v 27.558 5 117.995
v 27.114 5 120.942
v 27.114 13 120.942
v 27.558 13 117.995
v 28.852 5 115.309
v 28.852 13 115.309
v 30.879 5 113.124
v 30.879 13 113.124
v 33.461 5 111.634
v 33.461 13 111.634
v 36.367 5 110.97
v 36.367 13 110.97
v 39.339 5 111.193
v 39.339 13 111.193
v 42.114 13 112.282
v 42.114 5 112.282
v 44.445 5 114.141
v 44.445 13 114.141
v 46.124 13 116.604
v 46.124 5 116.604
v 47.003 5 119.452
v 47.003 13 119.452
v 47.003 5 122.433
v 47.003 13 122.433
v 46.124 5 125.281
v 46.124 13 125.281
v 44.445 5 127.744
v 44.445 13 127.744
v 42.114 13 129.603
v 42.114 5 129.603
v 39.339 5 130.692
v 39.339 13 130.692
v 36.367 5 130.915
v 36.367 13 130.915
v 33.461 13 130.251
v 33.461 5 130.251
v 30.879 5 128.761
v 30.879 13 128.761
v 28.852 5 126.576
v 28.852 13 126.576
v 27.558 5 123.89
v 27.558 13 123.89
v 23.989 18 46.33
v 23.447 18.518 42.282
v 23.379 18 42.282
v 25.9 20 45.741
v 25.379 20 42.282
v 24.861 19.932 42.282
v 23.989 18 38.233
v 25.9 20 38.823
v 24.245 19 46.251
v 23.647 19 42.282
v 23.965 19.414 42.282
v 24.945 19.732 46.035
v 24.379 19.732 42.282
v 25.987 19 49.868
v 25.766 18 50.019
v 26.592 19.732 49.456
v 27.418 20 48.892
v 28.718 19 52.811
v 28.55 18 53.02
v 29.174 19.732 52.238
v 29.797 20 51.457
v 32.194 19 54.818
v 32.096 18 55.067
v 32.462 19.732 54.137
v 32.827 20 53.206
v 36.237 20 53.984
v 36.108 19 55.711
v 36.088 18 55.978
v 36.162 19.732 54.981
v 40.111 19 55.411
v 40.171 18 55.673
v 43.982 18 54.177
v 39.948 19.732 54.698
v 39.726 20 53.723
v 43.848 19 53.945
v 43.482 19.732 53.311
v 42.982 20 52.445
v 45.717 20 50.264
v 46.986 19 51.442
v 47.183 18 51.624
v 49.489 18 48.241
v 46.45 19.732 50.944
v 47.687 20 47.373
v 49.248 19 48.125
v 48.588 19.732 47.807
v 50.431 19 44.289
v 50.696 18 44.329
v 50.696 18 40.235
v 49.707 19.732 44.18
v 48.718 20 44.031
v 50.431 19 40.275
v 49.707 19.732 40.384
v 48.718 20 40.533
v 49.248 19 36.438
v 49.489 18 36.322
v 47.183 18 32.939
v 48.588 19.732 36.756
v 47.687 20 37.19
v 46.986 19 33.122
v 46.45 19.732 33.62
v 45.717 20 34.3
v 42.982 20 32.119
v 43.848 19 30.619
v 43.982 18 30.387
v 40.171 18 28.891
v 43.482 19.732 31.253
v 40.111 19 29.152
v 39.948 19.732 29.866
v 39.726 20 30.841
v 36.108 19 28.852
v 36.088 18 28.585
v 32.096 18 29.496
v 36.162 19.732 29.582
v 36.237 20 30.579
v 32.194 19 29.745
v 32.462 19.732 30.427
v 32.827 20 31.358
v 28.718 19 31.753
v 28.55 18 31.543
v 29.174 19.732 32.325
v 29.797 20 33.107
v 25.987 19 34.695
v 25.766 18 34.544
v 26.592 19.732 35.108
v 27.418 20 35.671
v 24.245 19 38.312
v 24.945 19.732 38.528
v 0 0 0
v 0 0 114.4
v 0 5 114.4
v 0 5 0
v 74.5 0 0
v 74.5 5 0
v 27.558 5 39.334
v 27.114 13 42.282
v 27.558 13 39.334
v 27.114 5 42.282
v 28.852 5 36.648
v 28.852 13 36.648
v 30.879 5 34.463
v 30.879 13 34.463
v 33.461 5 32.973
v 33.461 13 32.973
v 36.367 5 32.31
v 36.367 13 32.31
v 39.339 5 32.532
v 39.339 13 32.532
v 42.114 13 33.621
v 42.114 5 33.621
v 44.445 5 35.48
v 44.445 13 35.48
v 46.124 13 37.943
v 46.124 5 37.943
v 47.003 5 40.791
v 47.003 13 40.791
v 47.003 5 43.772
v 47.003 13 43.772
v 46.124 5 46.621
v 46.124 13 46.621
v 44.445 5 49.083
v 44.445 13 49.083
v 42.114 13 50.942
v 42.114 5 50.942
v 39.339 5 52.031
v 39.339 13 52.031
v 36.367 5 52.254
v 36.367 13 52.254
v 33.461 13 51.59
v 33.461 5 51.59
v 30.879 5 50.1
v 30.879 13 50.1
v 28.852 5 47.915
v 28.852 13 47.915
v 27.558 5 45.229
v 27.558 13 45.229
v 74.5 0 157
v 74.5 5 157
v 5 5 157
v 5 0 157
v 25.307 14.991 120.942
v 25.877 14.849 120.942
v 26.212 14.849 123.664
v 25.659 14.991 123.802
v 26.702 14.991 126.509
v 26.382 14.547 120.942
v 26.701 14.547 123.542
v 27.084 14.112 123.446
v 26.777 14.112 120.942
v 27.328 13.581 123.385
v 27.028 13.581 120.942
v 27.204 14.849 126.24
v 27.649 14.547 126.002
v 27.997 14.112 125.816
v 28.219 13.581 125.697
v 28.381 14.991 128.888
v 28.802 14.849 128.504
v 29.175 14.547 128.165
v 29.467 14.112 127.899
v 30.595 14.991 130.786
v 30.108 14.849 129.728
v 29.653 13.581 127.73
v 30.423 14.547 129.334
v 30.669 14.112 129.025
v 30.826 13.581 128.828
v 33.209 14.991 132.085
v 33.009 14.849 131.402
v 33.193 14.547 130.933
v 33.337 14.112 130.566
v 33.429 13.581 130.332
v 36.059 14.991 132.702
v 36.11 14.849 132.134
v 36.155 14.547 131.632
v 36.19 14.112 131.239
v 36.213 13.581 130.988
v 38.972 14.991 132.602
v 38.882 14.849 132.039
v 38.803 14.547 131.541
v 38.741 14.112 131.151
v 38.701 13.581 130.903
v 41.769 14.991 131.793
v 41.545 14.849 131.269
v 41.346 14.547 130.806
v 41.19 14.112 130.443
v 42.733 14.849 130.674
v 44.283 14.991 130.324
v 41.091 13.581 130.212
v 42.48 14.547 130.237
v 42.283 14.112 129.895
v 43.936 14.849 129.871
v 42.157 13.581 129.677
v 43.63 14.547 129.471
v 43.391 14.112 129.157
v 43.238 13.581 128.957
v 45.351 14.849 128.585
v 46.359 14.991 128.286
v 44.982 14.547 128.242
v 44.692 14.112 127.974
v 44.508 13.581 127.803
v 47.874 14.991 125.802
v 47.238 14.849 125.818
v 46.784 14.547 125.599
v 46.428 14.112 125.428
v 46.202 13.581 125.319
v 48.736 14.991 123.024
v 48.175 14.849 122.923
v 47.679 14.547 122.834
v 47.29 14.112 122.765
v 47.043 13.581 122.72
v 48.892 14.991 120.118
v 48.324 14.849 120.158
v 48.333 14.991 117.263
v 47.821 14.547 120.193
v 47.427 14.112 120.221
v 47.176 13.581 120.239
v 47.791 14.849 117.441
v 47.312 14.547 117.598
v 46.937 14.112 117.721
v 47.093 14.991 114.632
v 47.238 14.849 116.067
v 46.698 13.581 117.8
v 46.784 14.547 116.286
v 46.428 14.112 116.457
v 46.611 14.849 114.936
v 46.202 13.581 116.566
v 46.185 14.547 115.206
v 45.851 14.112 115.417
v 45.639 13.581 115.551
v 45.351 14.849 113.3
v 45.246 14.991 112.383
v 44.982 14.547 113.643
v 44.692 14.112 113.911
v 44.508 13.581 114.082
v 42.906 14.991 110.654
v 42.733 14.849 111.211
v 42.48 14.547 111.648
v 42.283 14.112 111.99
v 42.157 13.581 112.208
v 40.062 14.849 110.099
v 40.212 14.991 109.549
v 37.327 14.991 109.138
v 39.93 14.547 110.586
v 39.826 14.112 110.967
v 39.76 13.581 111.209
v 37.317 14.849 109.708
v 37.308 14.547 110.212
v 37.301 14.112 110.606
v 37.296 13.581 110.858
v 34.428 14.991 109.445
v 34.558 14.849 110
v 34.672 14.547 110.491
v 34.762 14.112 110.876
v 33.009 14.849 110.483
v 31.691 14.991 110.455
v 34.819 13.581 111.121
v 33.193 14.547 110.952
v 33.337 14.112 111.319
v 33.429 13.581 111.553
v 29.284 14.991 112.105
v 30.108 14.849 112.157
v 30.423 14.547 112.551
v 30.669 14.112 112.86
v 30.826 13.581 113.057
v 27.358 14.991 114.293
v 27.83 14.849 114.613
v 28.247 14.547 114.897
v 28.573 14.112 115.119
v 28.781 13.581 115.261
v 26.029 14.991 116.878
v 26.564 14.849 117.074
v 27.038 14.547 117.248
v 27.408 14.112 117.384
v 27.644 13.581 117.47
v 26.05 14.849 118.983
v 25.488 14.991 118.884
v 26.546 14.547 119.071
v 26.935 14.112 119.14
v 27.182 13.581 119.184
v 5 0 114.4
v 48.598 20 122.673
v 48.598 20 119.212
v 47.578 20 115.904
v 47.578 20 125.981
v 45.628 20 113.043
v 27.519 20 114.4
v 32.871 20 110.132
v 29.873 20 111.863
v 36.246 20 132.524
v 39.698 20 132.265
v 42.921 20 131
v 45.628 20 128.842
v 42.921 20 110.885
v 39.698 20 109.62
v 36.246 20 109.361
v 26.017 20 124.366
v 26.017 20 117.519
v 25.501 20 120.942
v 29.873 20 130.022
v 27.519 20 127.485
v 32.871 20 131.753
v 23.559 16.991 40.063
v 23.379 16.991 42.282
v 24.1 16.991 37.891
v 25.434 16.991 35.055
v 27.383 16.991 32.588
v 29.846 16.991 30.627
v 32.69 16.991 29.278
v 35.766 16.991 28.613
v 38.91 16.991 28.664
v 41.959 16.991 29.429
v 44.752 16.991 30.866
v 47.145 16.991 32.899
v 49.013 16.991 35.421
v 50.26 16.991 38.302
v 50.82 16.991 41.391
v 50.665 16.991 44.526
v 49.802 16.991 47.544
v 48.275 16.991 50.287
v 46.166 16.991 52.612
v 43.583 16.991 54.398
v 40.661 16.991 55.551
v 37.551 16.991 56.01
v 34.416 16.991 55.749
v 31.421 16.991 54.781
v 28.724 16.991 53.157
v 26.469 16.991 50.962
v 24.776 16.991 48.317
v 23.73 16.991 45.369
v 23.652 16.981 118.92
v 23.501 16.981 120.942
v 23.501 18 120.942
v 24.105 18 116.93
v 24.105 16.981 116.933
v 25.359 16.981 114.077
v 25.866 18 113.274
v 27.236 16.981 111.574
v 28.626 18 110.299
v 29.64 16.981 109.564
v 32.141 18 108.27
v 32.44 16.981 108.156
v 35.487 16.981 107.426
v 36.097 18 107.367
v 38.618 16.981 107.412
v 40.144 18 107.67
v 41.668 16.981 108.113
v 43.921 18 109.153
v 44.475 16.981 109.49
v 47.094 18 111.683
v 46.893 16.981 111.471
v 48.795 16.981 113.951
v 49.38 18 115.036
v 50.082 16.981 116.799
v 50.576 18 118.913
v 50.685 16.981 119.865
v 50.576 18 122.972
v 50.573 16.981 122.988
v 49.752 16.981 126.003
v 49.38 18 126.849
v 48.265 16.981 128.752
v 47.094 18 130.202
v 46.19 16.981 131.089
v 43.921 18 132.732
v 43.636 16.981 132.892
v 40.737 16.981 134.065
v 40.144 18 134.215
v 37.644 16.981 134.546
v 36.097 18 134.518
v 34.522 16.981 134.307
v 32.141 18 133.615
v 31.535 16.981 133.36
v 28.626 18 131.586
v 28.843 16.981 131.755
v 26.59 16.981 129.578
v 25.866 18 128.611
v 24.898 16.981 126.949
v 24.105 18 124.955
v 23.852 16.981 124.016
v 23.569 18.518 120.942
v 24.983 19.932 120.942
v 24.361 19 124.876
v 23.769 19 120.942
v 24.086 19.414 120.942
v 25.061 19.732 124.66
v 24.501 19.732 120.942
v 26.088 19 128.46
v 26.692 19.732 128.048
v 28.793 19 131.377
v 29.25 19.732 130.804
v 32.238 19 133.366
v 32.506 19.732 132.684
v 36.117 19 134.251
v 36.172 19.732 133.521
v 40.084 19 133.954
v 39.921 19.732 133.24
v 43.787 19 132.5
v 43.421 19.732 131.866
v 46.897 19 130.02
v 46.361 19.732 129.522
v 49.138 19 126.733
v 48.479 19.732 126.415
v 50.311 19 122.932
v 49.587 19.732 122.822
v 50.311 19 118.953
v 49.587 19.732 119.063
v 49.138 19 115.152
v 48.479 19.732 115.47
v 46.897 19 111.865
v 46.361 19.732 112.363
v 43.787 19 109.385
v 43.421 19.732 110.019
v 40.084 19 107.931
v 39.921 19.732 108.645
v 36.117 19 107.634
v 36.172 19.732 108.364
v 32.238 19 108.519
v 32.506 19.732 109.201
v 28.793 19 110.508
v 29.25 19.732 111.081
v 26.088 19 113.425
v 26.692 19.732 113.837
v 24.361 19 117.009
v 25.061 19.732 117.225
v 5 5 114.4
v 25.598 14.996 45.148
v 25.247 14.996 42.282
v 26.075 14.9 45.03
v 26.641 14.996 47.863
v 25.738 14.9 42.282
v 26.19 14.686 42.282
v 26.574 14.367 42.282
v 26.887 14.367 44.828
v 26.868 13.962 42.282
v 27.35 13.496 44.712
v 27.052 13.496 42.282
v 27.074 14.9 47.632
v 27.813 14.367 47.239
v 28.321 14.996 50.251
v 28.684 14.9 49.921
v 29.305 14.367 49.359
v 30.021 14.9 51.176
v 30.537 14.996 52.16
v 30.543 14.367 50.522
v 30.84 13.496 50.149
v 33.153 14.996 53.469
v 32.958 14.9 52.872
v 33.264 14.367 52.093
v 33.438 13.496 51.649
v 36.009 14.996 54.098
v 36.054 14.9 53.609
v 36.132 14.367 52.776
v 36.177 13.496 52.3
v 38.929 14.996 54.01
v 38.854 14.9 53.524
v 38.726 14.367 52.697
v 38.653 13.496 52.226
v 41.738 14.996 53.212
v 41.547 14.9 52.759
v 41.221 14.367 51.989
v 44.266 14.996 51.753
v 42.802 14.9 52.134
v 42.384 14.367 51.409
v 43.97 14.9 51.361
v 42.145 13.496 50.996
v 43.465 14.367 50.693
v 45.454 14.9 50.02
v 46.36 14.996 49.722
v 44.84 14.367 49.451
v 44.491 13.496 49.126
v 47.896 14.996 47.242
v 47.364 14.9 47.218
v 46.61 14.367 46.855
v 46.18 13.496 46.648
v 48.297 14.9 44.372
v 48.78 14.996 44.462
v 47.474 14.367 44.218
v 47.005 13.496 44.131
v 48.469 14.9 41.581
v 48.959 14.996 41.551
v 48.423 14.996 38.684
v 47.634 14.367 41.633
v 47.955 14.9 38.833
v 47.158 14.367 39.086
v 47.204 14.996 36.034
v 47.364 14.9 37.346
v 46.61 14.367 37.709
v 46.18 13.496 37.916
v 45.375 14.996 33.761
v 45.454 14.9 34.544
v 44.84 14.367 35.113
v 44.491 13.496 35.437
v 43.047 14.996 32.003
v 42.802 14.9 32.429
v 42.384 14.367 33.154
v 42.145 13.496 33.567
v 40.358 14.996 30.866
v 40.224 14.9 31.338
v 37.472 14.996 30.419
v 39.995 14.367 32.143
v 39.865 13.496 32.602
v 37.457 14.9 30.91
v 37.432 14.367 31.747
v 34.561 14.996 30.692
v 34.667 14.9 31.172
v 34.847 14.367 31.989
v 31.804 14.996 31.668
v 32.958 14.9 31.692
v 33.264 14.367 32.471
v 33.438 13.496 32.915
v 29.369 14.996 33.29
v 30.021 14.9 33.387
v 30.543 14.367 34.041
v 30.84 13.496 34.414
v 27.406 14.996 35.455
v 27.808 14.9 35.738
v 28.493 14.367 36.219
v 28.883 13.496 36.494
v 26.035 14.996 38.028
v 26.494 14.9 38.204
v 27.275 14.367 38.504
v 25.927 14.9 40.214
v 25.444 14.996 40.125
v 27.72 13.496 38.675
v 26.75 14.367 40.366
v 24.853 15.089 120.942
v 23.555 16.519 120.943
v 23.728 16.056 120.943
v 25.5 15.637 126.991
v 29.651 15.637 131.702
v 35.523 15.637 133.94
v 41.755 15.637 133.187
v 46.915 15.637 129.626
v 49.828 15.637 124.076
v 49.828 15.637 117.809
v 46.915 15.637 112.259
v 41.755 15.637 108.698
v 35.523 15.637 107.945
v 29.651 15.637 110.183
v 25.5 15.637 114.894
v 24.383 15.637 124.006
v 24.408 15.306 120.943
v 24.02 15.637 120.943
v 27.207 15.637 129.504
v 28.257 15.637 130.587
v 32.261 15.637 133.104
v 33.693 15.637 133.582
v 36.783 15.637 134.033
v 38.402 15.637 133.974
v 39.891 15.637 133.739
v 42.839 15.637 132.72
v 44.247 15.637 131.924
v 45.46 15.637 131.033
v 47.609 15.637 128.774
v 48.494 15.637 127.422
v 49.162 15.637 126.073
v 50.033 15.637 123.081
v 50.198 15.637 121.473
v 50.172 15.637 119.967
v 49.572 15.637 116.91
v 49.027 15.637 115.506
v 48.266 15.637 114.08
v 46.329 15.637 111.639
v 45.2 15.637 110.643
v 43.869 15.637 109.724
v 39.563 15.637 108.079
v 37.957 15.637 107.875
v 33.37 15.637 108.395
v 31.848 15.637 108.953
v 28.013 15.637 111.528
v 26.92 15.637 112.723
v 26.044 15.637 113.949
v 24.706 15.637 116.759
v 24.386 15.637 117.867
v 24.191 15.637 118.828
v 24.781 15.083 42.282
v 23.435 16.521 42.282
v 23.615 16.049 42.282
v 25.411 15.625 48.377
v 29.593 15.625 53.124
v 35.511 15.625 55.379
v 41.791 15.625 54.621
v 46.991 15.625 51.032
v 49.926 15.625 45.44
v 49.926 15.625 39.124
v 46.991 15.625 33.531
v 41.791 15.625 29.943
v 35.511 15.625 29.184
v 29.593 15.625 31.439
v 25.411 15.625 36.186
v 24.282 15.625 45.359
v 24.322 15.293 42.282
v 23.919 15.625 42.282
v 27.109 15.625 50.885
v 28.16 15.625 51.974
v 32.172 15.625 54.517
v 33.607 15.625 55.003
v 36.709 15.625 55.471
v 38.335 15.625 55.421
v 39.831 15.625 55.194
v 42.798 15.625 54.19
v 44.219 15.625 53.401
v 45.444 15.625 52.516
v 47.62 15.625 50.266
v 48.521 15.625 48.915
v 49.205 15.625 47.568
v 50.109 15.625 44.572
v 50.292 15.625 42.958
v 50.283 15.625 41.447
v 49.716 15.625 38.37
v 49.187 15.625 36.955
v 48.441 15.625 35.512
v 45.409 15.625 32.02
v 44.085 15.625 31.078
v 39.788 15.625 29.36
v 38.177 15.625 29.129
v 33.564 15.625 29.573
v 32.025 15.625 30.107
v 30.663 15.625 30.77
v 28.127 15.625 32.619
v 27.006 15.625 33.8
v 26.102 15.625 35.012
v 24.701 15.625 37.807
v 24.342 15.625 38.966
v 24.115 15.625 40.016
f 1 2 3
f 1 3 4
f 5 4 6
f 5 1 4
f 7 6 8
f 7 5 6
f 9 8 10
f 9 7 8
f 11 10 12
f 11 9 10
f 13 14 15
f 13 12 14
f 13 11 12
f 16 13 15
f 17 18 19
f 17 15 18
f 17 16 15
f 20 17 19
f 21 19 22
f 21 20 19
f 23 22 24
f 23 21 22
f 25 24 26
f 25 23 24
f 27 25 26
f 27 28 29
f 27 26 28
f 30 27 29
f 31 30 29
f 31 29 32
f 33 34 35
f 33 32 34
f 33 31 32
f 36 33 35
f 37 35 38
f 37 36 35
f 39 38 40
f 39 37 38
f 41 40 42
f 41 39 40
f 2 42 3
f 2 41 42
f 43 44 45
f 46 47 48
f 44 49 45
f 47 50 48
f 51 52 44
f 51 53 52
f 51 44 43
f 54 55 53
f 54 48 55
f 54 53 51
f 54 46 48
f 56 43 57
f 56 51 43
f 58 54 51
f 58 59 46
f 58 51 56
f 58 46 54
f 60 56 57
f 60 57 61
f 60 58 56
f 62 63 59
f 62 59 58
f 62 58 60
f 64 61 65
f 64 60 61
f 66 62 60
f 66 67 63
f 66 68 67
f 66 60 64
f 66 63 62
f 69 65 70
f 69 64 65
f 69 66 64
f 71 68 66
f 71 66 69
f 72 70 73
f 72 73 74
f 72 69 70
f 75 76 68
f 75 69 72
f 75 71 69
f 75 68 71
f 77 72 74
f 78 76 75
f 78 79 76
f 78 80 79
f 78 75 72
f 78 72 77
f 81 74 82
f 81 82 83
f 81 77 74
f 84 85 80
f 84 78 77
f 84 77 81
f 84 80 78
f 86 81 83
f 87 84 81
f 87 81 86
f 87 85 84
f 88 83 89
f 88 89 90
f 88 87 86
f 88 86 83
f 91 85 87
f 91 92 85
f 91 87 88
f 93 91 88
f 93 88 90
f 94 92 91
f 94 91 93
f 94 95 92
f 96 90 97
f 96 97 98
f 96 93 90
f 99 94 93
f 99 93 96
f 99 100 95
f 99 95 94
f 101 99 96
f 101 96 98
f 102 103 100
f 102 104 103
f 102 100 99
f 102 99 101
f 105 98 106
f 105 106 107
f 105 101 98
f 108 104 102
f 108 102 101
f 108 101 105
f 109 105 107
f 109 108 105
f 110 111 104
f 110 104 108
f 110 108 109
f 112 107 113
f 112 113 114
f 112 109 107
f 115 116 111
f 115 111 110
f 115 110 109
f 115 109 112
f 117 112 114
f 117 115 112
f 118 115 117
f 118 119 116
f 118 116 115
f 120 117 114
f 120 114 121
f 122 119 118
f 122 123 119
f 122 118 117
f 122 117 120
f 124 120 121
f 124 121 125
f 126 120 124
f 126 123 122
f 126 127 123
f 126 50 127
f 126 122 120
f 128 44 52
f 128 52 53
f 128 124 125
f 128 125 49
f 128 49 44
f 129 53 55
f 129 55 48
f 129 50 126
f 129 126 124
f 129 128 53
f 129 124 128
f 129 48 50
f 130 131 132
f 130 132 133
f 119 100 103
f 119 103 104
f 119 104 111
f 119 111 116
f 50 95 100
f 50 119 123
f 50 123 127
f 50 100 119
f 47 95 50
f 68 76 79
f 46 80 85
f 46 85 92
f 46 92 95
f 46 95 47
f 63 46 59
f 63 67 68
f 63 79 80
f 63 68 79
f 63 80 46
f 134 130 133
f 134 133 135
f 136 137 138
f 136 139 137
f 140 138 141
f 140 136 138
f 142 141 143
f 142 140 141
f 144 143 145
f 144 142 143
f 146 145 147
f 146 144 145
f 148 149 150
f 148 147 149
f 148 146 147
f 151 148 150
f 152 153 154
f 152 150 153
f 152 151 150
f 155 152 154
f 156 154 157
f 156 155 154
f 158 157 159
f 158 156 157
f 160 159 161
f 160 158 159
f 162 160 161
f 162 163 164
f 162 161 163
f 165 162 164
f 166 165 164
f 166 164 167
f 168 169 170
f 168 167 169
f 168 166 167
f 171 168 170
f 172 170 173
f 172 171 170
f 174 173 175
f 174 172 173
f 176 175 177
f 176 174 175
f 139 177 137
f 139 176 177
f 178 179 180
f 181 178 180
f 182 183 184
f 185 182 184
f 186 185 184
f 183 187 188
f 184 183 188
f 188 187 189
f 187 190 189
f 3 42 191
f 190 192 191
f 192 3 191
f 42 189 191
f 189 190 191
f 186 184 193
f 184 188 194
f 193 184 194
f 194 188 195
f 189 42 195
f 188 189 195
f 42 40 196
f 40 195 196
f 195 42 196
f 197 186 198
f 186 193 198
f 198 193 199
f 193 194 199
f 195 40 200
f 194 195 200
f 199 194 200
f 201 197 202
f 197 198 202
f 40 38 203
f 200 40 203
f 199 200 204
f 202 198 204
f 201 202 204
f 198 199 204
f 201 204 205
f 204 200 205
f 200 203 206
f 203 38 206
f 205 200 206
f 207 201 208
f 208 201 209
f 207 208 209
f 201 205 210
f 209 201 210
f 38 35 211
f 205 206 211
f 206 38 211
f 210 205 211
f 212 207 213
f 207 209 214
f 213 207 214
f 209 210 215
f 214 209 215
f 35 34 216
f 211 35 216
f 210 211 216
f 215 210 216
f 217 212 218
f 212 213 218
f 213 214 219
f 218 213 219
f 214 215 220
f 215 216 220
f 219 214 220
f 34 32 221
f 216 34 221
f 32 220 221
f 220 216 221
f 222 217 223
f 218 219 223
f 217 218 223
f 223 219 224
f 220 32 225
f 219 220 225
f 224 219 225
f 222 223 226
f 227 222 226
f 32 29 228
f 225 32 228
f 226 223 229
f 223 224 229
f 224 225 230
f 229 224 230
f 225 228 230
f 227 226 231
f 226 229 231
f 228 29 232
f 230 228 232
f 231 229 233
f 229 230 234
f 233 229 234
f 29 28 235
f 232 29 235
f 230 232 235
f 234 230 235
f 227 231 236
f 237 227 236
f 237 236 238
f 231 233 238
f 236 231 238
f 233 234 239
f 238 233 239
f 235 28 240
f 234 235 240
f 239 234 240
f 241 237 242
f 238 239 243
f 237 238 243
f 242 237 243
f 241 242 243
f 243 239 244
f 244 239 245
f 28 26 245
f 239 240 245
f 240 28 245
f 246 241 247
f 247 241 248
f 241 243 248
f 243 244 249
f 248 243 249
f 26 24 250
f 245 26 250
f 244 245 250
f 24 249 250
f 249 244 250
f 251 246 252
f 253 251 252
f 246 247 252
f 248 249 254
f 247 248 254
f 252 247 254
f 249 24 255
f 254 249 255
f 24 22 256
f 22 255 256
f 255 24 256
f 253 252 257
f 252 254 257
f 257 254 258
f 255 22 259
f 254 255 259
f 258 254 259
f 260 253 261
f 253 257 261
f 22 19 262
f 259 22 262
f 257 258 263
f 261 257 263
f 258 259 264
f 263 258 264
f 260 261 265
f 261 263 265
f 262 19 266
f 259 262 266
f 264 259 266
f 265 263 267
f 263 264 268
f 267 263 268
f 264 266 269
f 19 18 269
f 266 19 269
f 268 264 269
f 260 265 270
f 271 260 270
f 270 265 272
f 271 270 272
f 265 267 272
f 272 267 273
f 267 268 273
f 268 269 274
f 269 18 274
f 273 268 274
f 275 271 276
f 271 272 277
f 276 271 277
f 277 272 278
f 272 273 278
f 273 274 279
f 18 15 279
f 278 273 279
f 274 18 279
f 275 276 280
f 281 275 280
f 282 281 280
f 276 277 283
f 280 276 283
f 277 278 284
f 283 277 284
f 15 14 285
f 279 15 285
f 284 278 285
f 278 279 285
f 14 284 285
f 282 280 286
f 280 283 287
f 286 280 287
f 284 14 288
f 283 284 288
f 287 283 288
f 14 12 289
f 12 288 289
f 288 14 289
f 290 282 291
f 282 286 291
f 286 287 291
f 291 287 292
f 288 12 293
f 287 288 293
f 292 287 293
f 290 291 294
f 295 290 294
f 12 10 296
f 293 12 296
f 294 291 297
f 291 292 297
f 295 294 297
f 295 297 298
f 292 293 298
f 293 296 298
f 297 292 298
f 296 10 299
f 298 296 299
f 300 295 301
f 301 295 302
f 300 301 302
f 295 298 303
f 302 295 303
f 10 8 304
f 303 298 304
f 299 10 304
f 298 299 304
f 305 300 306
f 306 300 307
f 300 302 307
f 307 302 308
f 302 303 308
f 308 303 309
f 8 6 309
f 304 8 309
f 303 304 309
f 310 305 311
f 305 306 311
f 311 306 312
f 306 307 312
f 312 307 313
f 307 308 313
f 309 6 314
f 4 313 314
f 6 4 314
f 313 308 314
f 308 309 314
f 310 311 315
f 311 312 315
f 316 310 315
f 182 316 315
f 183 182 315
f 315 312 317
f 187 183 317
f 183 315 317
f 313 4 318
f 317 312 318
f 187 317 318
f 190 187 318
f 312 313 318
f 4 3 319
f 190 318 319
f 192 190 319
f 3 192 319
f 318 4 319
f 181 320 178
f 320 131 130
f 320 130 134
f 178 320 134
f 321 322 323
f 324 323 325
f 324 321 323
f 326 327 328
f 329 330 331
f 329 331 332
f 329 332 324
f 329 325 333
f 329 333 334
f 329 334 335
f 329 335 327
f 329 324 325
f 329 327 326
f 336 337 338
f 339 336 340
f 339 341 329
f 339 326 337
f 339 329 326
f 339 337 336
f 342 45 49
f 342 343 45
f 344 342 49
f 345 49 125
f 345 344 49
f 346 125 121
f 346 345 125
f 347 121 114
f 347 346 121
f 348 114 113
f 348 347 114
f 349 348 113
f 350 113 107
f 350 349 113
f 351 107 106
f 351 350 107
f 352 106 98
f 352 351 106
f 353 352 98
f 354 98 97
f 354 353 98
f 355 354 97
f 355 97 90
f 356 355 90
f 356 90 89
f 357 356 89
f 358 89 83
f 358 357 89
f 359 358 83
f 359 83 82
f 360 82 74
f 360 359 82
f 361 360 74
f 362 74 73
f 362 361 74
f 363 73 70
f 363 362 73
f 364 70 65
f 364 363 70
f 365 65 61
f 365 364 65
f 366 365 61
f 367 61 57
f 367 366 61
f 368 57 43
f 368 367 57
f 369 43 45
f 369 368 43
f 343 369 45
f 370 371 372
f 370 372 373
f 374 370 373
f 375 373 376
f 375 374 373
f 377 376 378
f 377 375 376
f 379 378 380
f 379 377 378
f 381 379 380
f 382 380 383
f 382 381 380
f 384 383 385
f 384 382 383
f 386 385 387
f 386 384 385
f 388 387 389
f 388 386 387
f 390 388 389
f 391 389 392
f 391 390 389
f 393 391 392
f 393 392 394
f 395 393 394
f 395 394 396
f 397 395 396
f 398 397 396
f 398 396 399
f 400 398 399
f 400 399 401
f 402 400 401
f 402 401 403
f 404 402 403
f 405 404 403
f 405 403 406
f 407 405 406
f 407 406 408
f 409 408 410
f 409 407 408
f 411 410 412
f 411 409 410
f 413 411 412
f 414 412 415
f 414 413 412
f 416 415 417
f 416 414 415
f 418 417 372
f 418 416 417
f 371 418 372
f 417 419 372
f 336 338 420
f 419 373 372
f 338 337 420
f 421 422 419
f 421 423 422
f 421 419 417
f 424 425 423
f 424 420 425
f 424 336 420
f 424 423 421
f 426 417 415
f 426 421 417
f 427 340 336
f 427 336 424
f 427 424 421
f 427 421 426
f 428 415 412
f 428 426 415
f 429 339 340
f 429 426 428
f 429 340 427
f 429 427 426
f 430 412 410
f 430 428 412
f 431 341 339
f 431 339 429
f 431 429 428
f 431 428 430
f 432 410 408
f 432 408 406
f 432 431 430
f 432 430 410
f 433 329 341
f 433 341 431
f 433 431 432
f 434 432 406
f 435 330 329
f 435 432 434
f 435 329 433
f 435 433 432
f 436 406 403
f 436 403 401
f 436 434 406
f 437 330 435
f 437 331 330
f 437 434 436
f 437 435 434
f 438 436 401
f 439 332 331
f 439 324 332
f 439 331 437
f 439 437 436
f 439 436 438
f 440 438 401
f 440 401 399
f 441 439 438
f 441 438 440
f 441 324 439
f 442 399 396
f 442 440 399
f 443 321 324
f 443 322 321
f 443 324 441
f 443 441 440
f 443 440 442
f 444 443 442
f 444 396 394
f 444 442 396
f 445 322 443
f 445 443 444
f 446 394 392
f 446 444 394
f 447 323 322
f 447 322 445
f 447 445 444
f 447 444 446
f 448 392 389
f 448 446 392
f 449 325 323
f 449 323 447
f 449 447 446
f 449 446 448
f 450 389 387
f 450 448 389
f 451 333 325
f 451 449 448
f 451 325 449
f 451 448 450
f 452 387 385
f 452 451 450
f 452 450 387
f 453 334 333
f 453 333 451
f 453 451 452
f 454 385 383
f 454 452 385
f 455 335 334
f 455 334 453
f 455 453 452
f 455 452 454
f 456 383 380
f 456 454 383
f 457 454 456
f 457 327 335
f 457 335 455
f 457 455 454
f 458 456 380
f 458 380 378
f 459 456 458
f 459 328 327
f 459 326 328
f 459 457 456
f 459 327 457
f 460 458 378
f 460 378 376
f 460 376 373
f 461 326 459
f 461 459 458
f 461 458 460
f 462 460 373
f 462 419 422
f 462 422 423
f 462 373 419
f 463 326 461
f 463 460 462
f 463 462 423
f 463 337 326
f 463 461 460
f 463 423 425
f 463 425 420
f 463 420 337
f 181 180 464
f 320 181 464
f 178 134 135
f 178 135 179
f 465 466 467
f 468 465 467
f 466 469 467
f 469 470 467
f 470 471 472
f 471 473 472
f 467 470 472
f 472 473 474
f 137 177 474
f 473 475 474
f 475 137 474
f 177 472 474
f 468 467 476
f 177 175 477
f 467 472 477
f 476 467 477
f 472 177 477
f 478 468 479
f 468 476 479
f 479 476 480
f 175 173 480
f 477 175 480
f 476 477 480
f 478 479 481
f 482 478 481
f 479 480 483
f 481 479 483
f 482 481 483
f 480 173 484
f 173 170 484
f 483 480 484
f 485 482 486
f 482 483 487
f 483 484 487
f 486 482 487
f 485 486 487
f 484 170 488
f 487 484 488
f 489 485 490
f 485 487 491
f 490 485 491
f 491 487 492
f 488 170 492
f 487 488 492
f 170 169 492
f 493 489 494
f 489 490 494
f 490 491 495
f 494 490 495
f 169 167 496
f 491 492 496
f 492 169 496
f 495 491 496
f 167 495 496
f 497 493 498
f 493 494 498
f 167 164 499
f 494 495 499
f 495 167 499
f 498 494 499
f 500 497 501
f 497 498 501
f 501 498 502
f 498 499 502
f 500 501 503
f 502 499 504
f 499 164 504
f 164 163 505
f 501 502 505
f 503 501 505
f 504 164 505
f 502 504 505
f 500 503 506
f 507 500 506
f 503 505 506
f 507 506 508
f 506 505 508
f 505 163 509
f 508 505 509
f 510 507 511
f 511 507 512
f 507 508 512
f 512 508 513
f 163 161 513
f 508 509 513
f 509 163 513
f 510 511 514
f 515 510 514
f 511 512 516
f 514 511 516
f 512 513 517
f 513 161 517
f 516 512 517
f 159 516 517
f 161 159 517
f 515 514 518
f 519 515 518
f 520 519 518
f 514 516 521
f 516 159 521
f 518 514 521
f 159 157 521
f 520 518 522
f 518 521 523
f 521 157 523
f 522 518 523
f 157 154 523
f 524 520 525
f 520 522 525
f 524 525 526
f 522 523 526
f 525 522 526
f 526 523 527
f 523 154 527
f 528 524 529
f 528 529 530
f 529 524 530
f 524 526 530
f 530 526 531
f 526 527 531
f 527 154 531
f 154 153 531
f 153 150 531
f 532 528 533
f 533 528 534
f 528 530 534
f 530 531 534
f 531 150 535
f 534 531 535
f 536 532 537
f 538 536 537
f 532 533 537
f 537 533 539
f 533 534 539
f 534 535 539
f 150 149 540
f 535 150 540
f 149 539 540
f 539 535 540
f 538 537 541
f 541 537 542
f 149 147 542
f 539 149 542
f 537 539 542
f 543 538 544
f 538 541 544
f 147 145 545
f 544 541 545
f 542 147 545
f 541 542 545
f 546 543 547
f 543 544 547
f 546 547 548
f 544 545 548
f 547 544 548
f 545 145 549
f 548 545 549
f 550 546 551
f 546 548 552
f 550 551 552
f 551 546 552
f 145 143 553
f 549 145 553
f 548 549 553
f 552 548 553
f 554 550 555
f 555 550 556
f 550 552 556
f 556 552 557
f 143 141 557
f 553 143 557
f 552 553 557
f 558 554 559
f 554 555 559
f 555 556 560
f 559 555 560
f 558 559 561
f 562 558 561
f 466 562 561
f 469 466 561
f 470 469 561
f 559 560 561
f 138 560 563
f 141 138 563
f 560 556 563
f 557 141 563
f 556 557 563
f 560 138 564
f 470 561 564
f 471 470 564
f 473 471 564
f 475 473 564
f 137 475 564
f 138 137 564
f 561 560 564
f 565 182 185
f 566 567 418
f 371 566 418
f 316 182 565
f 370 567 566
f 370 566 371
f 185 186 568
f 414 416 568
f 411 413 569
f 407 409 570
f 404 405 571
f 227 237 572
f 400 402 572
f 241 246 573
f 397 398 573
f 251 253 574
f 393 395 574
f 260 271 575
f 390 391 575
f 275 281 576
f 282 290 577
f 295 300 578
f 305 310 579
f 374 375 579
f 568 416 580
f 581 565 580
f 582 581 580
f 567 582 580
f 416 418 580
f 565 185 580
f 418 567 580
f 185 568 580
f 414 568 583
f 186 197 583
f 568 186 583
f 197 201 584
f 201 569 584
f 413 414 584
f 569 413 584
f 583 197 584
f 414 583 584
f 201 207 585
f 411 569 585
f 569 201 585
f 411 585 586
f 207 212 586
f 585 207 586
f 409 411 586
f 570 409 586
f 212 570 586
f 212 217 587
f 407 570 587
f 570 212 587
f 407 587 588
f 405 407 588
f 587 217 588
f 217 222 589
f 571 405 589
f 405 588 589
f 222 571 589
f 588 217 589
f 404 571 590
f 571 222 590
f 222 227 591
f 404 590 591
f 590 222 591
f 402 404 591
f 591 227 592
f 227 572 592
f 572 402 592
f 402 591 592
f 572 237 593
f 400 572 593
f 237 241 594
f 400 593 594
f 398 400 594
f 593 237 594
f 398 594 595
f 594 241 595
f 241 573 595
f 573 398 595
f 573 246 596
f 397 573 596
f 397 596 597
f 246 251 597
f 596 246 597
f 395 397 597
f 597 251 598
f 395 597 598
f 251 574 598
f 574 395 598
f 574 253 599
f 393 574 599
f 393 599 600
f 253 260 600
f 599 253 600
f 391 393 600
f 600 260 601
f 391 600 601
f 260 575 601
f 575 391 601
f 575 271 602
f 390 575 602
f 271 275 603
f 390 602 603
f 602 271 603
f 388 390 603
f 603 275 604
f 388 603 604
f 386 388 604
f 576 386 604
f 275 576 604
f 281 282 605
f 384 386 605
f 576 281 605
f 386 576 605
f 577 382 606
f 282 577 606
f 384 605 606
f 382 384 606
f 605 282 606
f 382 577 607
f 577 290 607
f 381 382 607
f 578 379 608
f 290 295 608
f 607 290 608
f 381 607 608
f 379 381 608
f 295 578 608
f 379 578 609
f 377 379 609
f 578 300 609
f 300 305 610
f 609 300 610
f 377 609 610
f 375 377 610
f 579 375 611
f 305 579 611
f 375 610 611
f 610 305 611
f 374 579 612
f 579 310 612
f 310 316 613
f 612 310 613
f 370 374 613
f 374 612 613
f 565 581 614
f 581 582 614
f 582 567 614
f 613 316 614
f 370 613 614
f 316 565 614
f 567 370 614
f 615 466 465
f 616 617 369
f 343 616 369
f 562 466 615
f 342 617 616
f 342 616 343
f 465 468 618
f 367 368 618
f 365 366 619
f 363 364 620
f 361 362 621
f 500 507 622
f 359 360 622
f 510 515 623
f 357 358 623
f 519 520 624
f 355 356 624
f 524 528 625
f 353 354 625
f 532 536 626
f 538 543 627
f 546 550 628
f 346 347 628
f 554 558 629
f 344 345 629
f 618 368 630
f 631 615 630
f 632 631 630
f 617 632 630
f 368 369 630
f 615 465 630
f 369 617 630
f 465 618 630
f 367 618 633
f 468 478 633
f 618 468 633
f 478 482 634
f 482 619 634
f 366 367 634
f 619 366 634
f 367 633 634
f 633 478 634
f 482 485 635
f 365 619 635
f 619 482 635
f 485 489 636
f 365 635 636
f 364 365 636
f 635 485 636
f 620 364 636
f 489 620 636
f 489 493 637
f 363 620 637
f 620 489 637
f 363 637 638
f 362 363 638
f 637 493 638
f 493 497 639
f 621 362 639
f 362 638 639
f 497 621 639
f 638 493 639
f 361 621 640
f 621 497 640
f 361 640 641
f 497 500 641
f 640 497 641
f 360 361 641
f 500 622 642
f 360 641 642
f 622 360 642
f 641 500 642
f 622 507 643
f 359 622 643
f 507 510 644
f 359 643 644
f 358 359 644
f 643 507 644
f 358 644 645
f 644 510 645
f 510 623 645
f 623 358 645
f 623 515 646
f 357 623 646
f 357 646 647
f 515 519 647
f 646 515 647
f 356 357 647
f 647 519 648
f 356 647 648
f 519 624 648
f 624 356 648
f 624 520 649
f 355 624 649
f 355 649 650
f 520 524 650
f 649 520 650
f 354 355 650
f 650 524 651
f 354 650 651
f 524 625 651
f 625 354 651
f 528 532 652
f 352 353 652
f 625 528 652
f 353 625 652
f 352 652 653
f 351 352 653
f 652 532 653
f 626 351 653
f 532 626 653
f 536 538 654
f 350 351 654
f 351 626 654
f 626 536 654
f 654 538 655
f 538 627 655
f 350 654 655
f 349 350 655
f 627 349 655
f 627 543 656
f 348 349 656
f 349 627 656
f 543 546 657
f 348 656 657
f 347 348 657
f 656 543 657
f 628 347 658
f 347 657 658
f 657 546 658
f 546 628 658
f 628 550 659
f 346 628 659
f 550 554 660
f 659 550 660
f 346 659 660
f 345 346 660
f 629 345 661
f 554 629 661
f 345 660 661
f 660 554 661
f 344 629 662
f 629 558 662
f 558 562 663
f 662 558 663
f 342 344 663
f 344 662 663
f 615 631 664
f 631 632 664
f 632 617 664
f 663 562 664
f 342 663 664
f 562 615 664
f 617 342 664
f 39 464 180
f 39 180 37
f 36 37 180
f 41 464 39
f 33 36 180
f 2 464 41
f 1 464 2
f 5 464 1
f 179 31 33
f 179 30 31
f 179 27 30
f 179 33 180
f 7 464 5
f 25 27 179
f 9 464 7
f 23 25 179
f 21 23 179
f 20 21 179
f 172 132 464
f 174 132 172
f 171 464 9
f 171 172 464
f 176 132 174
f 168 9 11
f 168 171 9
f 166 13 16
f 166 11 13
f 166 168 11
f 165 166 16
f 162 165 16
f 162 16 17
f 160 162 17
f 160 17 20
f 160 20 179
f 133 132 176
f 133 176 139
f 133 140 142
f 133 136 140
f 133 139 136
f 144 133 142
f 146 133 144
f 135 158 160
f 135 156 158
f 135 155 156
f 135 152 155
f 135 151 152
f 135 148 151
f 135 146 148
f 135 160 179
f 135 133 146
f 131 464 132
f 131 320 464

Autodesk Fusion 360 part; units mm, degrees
sketch "Sketch1" plane through (0, 0, 0) normal (0, 1, 0) x (1, 0, 0)
  line L0 (0, 0) -> (74.5, 0)
  line L1 (74.5, 0) -> (74.5, -114.4)
  line L2 (74.5, -114.4) -> (0, -114.4)
  line L3 (0, -114.4) -> (0, 0)
  dimension "d1" = 74.5
  dimension "d2" = 114.4
extrude "Extrude1" add sketch "Sketch1" along normal blind 5
sketch "Sketch2" plane through (0, 5, 0) normal (0, 1, 0) x (-1, 0, 0)
  line L0 (0, 114.4) -> (-74.5, 114.4)
  line L1 (-74.5, 114.4) -> (-74.5, 0)
  line L2 (-74.5, 0) -> (0, 0)
  line L3 (0, 0) -> (0, 114.4)
  line L4 (0, 114.4) -> (-5, 114.4)
  line L5 (-5, 114.4) -> (-74.5, 114.4)
  line L6 (-74.5, 114.4) -> (-74.5, 157)
  line L7 (-74.5, 157) -> (-5, 157)
  line L8 (-5, 157) -> (-5, 114.4)
  dimension "d5" = 5
  dimension "d6" = 69.5
  dimension "d7" = 42.6
extrude "Extrude2" add sketch "Sketch2" against normal blind 5 contours L0 L5 L6 L7 L8
sketch "Sketch5" plane through (0, 5, 0) normal (0, 1, 0) x (-1, 0, 0)
  line L0 (0, 114.4) -> (-5, 114.4)
  line L1 (-5, 114.4) -> (-5, 157)
  line L2 (-5, 157) -> (-74.5, 157)
  line L3 (-74.5, 157) -> (-74.5, 0)
  line L4 (-74.5, 0) -> (0, 0)
  line L5 (0, 0) -> (0, 114.4)
  circle A0 centre (-37.1142, 42.2817) radius 10
  dimension "d21" = 20
extrude "Extrude3" add sketch "Sketch5" along normal blind 10 contours A0
sketch "Sketch6" plane through (0, 15, 0) normal (0, 1, 0) x (-1, 0, 0)
  circle A0 centre (-37.1142, 42.2817) radius 10
  circle A1 centre (-37.1142, 42.2817) radius 13.7352
extrude "Extrude4" add sketch "Sketch6" along normal blind 5 contours A0 | A1
fillet "Fillet1" radius 2 1 edges at (46.4375, 15, 38.6655)
fillet "Fillet2" radius 2 2 edges at (49.9199, 15, 37.3148) (49.9199, 20, 37.3148)
sketch "Sketch7" plane through (0, 5, 0) normal (0, 1, 0) x (-1, 0, 0)
  circle A0 centre (-37.1142, 42.2817) radius 10
  line L0 (0, 114.4) -> (-5, 114.4)
  line L1 (-5, 114.4) -> (-5, 157)
  line L2 (-5, 157) -> (-74.5, 157)
  line L3 (-74.5, 157) -> (-74.5, 0)
  line L4 (-74.5, 0) -> (0, 0)
  line L5 (0, 0) -> (0, 114.4)
  circle A1 centre (-37.1142, 120.9425) radius 10
  dimension "d30" = 20
extrude "Extrude5" add sketch "Sketch7" along normal blind 10 contours A1
sketch "Sketch8" plane through (0, 15, 0) normal (0, 1, 0) x (-1, 0, 0)
  circle A0 centre (-37.1142, 120.9425) radius 10
  circle A1 centre (-37.1142, 120.9425) radius 13.6136
extrude "Extrude6" add sketch "Sketch8" along normal blind 5 contours A0 | A1
fillet "Fillet3" radius 2 1 edges at (46.4375, 15, 117.3263)
fillet "Fillet4" radius 2 2 edges at (49.8066, 15, 116.0196) (49.8066, 20, 116.0196)
